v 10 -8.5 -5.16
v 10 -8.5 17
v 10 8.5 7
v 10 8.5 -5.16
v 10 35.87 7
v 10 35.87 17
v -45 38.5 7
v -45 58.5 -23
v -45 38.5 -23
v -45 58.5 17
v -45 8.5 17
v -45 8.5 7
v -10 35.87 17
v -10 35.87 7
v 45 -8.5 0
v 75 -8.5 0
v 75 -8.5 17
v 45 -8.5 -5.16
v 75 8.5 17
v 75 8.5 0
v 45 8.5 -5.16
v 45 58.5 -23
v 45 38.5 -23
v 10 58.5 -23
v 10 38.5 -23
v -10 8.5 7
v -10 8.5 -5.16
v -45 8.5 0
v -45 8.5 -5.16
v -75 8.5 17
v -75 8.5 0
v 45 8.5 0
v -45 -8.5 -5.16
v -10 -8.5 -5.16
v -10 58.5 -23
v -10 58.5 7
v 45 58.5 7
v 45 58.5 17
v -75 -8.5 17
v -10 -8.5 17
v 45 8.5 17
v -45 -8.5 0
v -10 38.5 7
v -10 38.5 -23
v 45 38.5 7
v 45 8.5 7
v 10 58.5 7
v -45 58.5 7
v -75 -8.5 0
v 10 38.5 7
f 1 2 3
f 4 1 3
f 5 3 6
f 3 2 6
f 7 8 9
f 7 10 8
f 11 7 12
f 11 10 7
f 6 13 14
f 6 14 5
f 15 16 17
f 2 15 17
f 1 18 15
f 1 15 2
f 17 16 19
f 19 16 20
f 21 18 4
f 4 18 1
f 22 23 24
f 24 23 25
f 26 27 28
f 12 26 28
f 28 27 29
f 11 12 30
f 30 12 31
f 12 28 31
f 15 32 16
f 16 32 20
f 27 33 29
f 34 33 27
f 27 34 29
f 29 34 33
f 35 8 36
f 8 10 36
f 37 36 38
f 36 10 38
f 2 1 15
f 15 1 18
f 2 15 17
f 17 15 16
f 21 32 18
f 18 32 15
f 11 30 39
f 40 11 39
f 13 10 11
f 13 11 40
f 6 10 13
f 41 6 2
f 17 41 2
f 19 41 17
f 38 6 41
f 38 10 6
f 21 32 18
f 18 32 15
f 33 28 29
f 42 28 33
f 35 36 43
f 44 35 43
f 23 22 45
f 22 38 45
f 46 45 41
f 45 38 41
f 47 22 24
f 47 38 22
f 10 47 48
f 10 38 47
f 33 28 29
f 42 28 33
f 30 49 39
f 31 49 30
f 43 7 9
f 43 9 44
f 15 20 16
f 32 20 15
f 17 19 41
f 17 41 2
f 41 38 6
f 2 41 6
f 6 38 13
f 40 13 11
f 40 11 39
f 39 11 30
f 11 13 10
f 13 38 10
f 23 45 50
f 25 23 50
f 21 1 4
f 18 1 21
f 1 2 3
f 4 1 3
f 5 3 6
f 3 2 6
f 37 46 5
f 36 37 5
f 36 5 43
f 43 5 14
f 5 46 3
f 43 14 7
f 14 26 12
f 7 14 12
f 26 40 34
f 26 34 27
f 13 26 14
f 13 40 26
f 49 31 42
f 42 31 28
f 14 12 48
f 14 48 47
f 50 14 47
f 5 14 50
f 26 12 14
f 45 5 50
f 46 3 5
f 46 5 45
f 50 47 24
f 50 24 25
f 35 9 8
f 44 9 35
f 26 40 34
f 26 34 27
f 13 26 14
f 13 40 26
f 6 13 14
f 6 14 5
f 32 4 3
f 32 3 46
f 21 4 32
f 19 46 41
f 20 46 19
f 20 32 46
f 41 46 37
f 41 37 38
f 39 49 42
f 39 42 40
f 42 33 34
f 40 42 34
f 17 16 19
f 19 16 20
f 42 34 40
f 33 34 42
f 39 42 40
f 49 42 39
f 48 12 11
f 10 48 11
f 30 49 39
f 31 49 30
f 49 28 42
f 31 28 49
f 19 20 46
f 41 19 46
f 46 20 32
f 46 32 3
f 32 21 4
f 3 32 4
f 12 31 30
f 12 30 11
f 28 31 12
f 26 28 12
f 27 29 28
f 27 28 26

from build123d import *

# Parameters (mm, degrees)
F5_W      = 150
F5_H      = 17
F6_DEPTH  = 17
F7_W      = 90
F7_H      = 17
F8_DEPTH  = 5.16
F0_W      = 90
F0_H      = 10
F9_DEPTH  = 50
F1_W      = 35
F1_H      = 20
F10_DEPTH = 30
F4_W      = 20
F4_H      = 44.370009
F11_DEPTH = 50


with BuildPart() as f6:
    # F5 (on Top) → F6 (new body)
    with BuildSketch(Plane.XY):
        Rectangle(F5_W, F5_H)
    extrude(amount=F6_DEPTH)

    # F7 (on face) → F8 (join)
    with BuildSketch(Plane(origin=(0, 0, 0), x_dir=(1, 0, 0), z_dir=(0, 0, -1))):
        Rectangle(F7_W, F7_H)
    extrude(amount=F8_DEPTH)

    # F0 (on face) → F9 (join)
    with BuildSketch(Plane(origin=(0, 8.5, 0), x_dir=(-1, 0, 0), z_dir=(0, 1, 0))):
        with Locations((0, 12)):
            Rectangle(F0_W, F0_H)
    extrude(amount=F9_DEPTH)

    # F1 (on face) → F10 (join)
    with BuildSketch(Plane(origin=(0, 0, 7), x_dir=(1, 0, 0), z_dir=(0, 0, -1))):
        with Locations((-27.5, -48.5)):
            Rectangle(F1_W, F1_H)
    extrude(amount=F10_DEPTH)


with BuildPart() as f2_1:
    # F2: instance of F6
    add(f6.part.mirror(Plane.YZ))


with BuildPart() as f11_tool:
    # F4 (on face) → F11 (new body)
    with BuildSketch(Plane.XY.offset(17)):
        with Locations((0, 13.685004)):
            Rectangle(F4_W, F4_H)
    extrude(amount=-F11_DEPTH)


with BuildPart() as f6_1:
    add(f6.part)

    # F11: cut by f11_tool
    add(f11_tool.part, mode=Mode.SUBTRACT)


with BuildPart() as f2_1_1:
    add(f2_1.part)

    # F11: cut by f11_tool
    add(f11_tool.part, mode=Mode.SUBTRACT)


solid = Compound([f6_1.part, f2_1_1.part])
